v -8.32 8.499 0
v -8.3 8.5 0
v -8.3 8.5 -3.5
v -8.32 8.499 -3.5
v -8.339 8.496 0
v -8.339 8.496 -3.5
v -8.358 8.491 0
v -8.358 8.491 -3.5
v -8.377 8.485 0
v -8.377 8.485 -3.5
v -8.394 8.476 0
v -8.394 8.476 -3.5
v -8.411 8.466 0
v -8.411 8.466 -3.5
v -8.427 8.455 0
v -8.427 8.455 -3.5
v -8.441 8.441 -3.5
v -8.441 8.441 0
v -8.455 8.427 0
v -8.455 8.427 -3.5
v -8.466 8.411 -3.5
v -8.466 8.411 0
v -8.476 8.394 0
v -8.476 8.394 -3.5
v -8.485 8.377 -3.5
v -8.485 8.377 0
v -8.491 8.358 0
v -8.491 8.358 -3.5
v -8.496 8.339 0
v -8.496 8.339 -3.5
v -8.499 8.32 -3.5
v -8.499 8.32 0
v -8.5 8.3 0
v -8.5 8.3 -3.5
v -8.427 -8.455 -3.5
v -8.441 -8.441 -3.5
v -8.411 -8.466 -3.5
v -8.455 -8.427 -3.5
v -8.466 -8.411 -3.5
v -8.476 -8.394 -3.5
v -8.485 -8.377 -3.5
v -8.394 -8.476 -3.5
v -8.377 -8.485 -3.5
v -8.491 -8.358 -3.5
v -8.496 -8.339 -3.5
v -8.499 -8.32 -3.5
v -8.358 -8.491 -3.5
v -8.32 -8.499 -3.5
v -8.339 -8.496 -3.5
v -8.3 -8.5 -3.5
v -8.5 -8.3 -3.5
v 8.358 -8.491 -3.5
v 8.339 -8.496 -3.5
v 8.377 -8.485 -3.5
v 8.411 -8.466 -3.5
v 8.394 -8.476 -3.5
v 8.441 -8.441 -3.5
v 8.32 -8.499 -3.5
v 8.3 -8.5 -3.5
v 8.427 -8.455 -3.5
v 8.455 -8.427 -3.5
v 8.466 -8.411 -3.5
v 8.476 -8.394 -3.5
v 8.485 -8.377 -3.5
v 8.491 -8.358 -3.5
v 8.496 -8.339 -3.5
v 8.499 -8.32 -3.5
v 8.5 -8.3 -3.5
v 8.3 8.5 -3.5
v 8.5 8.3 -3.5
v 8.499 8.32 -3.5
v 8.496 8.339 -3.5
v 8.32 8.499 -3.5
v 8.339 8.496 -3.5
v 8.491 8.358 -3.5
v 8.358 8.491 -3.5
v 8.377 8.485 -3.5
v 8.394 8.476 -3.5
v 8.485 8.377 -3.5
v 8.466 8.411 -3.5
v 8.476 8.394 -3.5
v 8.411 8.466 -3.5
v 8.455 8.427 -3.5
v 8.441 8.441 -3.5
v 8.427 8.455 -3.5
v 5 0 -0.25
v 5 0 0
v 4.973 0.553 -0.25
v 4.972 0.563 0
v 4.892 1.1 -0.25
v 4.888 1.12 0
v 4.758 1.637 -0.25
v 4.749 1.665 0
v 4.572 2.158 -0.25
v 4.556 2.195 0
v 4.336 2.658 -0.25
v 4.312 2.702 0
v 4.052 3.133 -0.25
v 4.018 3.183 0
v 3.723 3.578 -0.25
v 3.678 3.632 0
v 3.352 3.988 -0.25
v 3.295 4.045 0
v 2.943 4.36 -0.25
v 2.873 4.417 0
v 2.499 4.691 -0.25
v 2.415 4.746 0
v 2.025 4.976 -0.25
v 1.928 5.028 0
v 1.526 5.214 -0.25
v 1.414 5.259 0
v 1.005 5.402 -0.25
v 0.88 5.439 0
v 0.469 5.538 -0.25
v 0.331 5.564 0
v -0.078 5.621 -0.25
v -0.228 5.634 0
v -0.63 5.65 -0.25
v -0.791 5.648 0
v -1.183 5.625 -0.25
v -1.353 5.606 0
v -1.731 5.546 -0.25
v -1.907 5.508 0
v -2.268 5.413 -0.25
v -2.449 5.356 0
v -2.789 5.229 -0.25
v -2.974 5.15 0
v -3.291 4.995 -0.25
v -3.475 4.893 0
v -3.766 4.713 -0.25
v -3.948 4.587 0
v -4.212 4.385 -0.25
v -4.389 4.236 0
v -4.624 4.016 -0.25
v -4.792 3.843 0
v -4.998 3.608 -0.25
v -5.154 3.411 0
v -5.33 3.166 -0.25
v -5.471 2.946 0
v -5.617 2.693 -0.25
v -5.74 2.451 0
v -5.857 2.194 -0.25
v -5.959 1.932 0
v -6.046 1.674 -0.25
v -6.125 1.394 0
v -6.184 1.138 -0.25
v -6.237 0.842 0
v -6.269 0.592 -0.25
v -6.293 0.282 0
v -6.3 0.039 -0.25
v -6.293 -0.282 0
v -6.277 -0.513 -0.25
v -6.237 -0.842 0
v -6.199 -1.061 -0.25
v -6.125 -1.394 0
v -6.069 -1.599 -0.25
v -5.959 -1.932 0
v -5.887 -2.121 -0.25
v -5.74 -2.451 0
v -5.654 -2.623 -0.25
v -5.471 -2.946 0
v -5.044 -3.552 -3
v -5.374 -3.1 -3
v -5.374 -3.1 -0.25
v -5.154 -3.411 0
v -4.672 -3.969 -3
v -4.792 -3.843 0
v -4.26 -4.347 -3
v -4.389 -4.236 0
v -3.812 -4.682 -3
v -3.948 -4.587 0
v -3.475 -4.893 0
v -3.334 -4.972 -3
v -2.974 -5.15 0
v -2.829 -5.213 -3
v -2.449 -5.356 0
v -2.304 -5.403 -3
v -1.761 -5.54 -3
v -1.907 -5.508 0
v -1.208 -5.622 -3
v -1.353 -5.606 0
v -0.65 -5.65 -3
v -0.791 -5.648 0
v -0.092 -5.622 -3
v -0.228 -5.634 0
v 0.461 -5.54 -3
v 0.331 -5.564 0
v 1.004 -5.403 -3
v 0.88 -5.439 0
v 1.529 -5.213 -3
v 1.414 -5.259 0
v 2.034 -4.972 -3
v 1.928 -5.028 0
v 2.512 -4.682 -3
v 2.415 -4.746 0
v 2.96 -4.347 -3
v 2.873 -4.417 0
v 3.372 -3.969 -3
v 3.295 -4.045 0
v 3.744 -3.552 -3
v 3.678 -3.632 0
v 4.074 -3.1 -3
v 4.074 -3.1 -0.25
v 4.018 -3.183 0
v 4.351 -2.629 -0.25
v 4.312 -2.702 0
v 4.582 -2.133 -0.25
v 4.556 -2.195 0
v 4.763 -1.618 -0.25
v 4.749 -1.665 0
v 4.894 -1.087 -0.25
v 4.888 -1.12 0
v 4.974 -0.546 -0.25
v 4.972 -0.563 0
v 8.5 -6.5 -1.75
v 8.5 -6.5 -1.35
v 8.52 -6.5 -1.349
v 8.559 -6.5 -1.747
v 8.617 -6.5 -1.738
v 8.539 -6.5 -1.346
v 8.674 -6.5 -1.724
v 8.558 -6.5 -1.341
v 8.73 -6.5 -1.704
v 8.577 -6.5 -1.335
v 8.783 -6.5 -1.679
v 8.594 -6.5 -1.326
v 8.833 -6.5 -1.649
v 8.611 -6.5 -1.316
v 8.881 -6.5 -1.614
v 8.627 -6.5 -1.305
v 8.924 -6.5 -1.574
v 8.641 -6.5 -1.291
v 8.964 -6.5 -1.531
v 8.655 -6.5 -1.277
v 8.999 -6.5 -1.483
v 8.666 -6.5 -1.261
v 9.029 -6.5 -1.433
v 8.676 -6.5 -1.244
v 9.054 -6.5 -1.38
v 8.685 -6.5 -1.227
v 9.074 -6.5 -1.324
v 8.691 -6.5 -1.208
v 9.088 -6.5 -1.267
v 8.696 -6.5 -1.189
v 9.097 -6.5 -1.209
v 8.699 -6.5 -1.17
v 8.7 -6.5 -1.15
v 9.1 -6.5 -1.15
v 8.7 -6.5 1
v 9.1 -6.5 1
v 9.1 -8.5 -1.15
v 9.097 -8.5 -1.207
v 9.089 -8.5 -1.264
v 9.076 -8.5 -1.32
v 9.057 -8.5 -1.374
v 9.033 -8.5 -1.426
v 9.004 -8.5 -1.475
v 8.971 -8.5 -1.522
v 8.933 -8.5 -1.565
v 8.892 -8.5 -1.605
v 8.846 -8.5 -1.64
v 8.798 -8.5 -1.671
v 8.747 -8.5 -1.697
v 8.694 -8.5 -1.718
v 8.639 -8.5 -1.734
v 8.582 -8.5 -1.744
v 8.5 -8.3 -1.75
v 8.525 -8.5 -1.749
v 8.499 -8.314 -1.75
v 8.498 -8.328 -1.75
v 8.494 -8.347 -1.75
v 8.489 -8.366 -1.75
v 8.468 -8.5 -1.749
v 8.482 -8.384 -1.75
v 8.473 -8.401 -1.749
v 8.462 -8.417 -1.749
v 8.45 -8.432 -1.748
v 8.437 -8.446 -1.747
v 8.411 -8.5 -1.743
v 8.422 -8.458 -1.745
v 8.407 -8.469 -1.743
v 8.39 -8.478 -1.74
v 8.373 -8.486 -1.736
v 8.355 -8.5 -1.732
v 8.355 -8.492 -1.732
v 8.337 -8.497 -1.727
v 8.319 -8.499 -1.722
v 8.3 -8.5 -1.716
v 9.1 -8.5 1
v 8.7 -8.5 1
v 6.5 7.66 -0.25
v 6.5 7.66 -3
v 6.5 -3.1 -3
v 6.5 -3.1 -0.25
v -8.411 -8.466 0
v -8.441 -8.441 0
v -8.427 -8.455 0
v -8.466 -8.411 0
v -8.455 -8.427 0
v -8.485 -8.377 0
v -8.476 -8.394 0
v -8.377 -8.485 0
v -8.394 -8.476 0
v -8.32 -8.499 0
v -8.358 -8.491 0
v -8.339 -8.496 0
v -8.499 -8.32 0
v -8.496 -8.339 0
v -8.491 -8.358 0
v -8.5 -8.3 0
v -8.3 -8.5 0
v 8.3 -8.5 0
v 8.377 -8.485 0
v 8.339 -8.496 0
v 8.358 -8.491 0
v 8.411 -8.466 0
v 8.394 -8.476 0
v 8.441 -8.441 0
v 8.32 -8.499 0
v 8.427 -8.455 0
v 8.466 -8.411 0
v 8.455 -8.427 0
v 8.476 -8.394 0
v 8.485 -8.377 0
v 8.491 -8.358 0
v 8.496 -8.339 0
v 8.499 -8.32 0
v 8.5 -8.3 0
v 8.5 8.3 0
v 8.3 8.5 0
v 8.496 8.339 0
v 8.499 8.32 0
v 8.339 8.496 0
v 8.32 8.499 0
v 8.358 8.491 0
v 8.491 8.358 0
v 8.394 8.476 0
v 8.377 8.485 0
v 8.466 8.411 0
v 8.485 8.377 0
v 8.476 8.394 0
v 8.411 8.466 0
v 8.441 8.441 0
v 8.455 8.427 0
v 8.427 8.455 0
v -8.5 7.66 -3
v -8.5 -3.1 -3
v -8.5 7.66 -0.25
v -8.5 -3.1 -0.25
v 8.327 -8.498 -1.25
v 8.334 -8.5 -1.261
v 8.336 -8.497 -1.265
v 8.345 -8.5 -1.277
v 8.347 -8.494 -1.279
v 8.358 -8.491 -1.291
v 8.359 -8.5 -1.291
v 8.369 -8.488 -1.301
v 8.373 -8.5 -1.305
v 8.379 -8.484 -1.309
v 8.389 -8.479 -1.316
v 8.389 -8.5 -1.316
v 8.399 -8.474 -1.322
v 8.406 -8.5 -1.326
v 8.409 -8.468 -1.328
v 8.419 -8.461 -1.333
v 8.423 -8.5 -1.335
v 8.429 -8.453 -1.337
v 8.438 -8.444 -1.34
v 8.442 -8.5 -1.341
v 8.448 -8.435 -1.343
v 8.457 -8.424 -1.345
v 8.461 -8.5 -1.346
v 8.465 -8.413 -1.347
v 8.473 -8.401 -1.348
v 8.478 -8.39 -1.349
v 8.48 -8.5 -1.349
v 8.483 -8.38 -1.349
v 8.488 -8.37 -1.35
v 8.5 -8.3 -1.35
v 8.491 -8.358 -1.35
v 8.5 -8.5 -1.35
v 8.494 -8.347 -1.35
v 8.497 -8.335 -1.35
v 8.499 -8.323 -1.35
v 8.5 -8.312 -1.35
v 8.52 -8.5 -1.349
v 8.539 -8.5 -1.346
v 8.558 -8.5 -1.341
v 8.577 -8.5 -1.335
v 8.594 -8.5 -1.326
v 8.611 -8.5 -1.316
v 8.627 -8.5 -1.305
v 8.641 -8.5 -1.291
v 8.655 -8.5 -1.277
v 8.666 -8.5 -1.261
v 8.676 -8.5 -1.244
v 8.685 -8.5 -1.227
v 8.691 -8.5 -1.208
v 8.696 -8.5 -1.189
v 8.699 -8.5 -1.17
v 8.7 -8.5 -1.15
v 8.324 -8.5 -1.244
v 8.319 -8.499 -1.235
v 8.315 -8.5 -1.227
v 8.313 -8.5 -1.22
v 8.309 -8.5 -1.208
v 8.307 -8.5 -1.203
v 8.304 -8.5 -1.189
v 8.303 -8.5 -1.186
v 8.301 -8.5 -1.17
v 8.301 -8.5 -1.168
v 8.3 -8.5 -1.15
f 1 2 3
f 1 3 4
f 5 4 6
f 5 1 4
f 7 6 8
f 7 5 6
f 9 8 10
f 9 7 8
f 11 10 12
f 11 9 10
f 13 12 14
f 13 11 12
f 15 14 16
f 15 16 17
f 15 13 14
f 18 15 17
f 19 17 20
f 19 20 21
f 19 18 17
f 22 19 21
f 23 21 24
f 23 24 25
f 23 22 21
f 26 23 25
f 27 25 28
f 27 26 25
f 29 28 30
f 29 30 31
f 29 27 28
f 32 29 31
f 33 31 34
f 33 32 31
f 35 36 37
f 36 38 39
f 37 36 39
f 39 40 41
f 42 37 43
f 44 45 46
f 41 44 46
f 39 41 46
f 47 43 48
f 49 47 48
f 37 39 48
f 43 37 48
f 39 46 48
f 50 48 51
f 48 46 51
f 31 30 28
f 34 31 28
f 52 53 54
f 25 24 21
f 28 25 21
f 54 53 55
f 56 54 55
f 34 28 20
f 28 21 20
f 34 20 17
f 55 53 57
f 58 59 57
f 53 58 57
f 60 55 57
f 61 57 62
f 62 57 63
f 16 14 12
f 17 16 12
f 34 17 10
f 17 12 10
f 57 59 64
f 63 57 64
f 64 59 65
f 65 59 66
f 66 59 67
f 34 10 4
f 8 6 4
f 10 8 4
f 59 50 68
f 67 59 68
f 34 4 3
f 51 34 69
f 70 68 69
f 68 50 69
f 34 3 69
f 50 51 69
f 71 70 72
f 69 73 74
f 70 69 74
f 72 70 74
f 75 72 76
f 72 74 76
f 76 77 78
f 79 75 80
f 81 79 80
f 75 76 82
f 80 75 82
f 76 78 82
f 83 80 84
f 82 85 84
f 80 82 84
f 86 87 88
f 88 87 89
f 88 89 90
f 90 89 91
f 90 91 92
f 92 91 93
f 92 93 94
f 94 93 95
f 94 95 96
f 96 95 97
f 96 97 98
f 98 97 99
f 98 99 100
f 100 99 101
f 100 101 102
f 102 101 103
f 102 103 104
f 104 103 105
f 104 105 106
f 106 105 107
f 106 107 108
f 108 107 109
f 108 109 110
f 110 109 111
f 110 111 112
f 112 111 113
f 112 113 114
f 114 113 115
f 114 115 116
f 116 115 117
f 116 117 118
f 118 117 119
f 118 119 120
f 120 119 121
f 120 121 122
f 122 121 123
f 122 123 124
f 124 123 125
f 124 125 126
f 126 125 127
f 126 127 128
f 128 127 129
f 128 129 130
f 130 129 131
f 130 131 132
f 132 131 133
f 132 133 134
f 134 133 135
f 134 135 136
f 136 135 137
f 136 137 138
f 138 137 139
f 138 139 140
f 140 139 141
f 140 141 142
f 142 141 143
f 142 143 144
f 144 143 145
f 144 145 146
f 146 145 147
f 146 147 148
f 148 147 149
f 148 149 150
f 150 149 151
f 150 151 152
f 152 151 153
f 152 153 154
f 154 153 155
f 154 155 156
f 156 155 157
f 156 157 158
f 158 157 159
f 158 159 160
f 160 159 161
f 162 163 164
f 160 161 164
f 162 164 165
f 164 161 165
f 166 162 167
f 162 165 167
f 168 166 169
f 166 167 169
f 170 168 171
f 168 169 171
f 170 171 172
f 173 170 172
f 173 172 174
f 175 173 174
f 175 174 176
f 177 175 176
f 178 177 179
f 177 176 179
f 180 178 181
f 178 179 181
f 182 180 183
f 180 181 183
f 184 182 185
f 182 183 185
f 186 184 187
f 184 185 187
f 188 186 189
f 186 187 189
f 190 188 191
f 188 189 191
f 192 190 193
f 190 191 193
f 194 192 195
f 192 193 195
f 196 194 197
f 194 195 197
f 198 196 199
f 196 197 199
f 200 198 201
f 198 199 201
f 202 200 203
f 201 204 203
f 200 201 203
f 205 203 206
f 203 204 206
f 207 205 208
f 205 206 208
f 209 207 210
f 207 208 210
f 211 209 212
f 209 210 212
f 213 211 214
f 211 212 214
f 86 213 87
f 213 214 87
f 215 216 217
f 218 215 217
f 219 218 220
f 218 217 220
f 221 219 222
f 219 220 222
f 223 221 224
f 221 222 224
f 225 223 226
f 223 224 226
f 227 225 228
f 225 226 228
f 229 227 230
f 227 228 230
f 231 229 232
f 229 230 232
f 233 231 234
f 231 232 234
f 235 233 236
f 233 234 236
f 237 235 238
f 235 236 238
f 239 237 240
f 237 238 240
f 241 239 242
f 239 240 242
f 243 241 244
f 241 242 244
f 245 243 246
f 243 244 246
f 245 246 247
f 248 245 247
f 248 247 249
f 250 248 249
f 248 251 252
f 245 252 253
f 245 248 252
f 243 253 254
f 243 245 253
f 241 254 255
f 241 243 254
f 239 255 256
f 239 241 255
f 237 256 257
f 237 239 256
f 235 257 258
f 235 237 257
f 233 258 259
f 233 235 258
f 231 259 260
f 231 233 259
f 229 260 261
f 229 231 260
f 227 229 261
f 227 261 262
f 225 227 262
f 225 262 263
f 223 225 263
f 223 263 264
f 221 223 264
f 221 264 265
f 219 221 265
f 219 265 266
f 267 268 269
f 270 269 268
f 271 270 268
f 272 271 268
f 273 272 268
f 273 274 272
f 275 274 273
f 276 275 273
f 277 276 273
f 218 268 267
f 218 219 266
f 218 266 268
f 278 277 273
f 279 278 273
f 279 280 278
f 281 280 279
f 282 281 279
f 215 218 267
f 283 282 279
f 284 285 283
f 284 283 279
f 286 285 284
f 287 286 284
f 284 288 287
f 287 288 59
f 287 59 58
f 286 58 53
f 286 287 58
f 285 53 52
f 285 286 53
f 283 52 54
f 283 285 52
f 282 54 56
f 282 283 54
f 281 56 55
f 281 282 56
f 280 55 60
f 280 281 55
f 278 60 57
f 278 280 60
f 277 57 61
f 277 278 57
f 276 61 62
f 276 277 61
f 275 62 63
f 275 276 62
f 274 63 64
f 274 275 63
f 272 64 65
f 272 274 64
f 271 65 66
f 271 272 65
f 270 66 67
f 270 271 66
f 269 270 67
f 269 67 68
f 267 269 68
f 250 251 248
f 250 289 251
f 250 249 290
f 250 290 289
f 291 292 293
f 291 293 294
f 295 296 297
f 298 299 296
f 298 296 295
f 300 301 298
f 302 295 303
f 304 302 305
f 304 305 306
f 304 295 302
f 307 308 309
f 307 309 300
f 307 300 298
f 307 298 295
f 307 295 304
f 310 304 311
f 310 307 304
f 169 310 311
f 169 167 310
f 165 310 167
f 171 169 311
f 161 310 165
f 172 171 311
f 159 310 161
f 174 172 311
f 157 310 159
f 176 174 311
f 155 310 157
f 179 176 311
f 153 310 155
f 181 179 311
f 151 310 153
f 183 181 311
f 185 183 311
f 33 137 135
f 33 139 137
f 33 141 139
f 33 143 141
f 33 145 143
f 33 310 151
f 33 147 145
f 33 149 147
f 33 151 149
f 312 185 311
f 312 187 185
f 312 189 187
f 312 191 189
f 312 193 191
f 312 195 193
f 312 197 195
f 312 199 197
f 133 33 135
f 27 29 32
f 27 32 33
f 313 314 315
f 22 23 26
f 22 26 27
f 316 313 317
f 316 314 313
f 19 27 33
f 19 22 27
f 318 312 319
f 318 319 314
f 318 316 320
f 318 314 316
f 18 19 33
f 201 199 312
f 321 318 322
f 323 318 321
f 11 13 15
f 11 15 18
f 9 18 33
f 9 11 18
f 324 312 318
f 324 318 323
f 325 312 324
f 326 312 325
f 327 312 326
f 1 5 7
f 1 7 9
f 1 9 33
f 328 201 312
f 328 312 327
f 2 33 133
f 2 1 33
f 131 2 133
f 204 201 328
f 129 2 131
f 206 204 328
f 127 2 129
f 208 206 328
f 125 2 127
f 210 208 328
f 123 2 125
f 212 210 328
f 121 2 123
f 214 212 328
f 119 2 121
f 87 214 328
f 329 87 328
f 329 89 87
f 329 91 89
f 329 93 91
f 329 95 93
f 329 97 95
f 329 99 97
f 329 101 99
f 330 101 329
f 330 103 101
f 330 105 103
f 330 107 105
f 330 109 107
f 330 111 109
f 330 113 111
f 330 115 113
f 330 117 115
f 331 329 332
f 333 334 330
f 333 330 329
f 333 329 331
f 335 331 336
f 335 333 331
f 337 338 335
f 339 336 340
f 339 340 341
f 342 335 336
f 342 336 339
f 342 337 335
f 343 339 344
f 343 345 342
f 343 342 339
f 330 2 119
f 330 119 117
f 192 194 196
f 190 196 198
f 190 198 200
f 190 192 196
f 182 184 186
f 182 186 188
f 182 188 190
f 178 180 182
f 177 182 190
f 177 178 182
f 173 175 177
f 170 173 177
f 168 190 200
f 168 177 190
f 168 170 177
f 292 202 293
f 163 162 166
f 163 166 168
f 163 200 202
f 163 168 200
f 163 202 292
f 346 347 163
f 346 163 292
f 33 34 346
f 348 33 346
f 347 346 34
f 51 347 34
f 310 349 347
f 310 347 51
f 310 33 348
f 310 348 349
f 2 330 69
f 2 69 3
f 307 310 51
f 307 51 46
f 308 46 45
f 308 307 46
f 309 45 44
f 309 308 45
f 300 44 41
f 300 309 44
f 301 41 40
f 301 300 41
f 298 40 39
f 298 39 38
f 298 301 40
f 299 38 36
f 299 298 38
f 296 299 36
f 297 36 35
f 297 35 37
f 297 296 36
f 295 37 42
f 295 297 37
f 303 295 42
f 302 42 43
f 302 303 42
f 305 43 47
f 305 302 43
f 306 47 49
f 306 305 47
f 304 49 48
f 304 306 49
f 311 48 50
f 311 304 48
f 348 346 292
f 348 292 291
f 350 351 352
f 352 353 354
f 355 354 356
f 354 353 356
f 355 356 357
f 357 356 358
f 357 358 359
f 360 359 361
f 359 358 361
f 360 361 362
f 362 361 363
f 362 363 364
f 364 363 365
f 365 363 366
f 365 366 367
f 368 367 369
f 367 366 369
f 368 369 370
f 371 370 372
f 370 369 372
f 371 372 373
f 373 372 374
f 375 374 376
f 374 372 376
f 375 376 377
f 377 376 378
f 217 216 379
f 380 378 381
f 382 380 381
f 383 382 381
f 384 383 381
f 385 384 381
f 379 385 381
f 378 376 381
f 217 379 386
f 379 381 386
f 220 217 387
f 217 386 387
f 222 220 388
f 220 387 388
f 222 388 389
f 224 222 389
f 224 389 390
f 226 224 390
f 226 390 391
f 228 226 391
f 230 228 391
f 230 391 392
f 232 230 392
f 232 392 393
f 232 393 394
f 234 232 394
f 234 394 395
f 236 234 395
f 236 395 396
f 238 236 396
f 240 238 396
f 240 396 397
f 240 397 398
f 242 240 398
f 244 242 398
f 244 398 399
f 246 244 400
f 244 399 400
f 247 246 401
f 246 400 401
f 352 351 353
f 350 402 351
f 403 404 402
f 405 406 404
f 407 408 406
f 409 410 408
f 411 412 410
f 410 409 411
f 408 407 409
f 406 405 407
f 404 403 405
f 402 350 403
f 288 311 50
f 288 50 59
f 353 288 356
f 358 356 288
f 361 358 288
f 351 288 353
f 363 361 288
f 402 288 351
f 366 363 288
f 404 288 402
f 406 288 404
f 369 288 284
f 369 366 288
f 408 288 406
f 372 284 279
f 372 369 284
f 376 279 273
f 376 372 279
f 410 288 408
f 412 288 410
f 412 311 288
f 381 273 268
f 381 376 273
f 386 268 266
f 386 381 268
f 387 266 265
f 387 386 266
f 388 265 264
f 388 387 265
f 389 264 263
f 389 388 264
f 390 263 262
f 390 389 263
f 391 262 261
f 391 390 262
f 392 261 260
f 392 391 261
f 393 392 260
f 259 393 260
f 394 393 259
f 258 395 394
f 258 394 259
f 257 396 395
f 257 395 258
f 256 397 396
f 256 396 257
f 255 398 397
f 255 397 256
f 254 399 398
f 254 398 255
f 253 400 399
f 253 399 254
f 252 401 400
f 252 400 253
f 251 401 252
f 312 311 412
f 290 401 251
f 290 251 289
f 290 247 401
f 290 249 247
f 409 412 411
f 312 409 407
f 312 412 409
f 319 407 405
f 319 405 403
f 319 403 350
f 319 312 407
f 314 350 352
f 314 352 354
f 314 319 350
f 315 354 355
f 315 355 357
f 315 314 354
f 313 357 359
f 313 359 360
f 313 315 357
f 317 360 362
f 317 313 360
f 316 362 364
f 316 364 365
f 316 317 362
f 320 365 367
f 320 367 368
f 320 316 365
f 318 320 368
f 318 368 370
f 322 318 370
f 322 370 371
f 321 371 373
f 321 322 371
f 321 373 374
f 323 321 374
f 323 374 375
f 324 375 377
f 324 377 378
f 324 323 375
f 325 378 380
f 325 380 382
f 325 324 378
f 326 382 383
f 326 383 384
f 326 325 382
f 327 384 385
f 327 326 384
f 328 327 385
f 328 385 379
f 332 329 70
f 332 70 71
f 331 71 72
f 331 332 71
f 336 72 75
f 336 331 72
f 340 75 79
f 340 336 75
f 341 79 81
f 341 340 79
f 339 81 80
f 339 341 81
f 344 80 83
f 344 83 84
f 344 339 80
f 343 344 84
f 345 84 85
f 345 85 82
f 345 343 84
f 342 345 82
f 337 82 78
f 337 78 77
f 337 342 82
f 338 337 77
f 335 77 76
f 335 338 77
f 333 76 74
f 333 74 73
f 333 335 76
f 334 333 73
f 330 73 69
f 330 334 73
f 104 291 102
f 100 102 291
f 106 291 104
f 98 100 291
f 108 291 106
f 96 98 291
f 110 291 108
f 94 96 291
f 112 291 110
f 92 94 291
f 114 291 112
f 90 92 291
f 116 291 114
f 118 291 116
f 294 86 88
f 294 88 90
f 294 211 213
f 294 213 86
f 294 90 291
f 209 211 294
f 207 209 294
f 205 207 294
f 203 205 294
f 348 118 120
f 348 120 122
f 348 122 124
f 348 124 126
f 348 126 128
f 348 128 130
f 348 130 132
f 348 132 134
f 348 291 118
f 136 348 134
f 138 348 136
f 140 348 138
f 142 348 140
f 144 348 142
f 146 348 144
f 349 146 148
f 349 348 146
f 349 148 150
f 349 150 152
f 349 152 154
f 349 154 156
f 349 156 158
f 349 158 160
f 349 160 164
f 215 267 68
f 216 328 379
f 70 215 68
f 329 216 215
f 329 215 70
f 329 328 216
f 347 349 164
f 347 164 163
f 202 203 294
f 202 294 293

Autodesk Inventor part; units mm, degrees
ref_plane "YZ Plane" through (0, 0, 0) normal (1, 0, 0) x (0, 1, 0)
ref_plane "XZ Plane" through (0, 0, 0) normal (0, 1, 0) x (-1, 0, 0)
ref_plane "XY Plane" through (0, 0, 0) normal (0, 0, 1) x (1, 0, 0)
sketch "master" plane through (0, 0, 0) normal (0, 0, 1) x (1, 0, 0)
  line L0 (-8.5, -8.5) -> (8.5, -8.5)
  line L1 (8.5, -8.5) -> (8.5, 8.5)
  line L2 (8.5, 8.5) -> (-8.5, 8.5)
  line L3 (-8.5, 8.5) -> (-8.5, -8.5)
  line L4 (-8.5, -8.5) -> (8.5, 8.5) construction
  line L5 (8.5, -8.5) -> (-8.5, 8.5) construction
  circle A0 centre (-0.65, 0) radius 5.65
  line L6 (5, 0) -> (8.5, 0) construction
  point P0 (0, 0)
  point P1 (0, 0)
  dimension "d1" = 11.3
  dimension "d0" = 17
  dimension "d12" = 3.5
  dimension "d14" = 9.15
  dimension "d22" = 0.65
extrude "body" add sketch "master" against normal blind 3.5 contours L3 L2 L1 L0 | A0
sketch "Sketch2" plane through (-8.5, -8.5, 0) normal (-1, 0, 0) x (0, 0, 1)
  line L0 (0, 17) -> (0, 0) projected
  line L1 (0, 17) -> (-3.5, 17) projected
  line L2 (-3.5, 0) -> (-3.5, 17) projected
  line L3 (0, 0) -> (-3.5, 0) projected
  line L4 (0, 17) -> (0, 0) projected
  line L5 (-3, 16.16) -> (-0.25, 16.16)
  line L6 (-0.25, 16.16) -> (-0.25, 5.4)
  line L7 (-0.25, 5.4) -> (-3, 5.4)
  line L8 (-3, 5.4) -> (-3, 16.16)
  point P0 (0, 8.5)
  dimension "d4" = 5.4
  dimension "d5" = 0.84
  dimension "d6" = 0.25
  dimension "d7" = 0.5
extrude "outlet" cut sketch "Sketch2" against normal blind 15 contours L5 L6 L7 L8
extrude "Extrusion3" cut sketch "master" against normal up to surface (3 mm away) contours A0
sketch "Sketch3" plane through (-8.5, -8.5, 0) normal (0, -1, 0) x (1, 0, 0)
  line L0 (17, 0) -> (17, -3.5) projected
  arc A0 (17, -1.75) -> (17.6, -1.15) centre (17, -1.15) ccw
  line L1 (17.6, -1.15) -> (17.6, 1)
  point P0 (8.5, 0)
  dimension "d15" = 1
  dimension "d16" = 0.6
sketch "Sketch4" plane through (8.5, -8.5, 0) normal (1, 0, 0) x (0, 0, -1)
  line L0 (1.35, 2) -> (1.35, 0)
  line L1 (1.35, 0) -> (1.75, 0)
  line L2 (1.75, 0) -> (1.75, 2)
  line L3 (1.75, 2) -> (1.35, 2)
  line L4 (1.35, 2) -> (1.75, 0) construction
  line L5 (1.35, 0) -> (1.75, 2) construction
  line L6 (0, 0) -> (3.5, 0) projected
  point P0 (0, 8.5)
  point P1 (1.55, 1)
  dimension "d17" = 2
  dimension "d18" = 0.4
sweep "Sweep1" add profiles "Sketch4" path "Sketch3" path curves A0 L1
fillet "Fillet1" radius 0.2 5 edges at (8.5, -8.5, -2.625) (8.5, 8.5, -1.75) (-8.5, -8.5, -1.75) (-8.5, 8.5, -1.75) (8.5, -8.5, -0.675)
properties part number "fan_sunon_ub3h3_500" material "PC/ABS Plastic"
